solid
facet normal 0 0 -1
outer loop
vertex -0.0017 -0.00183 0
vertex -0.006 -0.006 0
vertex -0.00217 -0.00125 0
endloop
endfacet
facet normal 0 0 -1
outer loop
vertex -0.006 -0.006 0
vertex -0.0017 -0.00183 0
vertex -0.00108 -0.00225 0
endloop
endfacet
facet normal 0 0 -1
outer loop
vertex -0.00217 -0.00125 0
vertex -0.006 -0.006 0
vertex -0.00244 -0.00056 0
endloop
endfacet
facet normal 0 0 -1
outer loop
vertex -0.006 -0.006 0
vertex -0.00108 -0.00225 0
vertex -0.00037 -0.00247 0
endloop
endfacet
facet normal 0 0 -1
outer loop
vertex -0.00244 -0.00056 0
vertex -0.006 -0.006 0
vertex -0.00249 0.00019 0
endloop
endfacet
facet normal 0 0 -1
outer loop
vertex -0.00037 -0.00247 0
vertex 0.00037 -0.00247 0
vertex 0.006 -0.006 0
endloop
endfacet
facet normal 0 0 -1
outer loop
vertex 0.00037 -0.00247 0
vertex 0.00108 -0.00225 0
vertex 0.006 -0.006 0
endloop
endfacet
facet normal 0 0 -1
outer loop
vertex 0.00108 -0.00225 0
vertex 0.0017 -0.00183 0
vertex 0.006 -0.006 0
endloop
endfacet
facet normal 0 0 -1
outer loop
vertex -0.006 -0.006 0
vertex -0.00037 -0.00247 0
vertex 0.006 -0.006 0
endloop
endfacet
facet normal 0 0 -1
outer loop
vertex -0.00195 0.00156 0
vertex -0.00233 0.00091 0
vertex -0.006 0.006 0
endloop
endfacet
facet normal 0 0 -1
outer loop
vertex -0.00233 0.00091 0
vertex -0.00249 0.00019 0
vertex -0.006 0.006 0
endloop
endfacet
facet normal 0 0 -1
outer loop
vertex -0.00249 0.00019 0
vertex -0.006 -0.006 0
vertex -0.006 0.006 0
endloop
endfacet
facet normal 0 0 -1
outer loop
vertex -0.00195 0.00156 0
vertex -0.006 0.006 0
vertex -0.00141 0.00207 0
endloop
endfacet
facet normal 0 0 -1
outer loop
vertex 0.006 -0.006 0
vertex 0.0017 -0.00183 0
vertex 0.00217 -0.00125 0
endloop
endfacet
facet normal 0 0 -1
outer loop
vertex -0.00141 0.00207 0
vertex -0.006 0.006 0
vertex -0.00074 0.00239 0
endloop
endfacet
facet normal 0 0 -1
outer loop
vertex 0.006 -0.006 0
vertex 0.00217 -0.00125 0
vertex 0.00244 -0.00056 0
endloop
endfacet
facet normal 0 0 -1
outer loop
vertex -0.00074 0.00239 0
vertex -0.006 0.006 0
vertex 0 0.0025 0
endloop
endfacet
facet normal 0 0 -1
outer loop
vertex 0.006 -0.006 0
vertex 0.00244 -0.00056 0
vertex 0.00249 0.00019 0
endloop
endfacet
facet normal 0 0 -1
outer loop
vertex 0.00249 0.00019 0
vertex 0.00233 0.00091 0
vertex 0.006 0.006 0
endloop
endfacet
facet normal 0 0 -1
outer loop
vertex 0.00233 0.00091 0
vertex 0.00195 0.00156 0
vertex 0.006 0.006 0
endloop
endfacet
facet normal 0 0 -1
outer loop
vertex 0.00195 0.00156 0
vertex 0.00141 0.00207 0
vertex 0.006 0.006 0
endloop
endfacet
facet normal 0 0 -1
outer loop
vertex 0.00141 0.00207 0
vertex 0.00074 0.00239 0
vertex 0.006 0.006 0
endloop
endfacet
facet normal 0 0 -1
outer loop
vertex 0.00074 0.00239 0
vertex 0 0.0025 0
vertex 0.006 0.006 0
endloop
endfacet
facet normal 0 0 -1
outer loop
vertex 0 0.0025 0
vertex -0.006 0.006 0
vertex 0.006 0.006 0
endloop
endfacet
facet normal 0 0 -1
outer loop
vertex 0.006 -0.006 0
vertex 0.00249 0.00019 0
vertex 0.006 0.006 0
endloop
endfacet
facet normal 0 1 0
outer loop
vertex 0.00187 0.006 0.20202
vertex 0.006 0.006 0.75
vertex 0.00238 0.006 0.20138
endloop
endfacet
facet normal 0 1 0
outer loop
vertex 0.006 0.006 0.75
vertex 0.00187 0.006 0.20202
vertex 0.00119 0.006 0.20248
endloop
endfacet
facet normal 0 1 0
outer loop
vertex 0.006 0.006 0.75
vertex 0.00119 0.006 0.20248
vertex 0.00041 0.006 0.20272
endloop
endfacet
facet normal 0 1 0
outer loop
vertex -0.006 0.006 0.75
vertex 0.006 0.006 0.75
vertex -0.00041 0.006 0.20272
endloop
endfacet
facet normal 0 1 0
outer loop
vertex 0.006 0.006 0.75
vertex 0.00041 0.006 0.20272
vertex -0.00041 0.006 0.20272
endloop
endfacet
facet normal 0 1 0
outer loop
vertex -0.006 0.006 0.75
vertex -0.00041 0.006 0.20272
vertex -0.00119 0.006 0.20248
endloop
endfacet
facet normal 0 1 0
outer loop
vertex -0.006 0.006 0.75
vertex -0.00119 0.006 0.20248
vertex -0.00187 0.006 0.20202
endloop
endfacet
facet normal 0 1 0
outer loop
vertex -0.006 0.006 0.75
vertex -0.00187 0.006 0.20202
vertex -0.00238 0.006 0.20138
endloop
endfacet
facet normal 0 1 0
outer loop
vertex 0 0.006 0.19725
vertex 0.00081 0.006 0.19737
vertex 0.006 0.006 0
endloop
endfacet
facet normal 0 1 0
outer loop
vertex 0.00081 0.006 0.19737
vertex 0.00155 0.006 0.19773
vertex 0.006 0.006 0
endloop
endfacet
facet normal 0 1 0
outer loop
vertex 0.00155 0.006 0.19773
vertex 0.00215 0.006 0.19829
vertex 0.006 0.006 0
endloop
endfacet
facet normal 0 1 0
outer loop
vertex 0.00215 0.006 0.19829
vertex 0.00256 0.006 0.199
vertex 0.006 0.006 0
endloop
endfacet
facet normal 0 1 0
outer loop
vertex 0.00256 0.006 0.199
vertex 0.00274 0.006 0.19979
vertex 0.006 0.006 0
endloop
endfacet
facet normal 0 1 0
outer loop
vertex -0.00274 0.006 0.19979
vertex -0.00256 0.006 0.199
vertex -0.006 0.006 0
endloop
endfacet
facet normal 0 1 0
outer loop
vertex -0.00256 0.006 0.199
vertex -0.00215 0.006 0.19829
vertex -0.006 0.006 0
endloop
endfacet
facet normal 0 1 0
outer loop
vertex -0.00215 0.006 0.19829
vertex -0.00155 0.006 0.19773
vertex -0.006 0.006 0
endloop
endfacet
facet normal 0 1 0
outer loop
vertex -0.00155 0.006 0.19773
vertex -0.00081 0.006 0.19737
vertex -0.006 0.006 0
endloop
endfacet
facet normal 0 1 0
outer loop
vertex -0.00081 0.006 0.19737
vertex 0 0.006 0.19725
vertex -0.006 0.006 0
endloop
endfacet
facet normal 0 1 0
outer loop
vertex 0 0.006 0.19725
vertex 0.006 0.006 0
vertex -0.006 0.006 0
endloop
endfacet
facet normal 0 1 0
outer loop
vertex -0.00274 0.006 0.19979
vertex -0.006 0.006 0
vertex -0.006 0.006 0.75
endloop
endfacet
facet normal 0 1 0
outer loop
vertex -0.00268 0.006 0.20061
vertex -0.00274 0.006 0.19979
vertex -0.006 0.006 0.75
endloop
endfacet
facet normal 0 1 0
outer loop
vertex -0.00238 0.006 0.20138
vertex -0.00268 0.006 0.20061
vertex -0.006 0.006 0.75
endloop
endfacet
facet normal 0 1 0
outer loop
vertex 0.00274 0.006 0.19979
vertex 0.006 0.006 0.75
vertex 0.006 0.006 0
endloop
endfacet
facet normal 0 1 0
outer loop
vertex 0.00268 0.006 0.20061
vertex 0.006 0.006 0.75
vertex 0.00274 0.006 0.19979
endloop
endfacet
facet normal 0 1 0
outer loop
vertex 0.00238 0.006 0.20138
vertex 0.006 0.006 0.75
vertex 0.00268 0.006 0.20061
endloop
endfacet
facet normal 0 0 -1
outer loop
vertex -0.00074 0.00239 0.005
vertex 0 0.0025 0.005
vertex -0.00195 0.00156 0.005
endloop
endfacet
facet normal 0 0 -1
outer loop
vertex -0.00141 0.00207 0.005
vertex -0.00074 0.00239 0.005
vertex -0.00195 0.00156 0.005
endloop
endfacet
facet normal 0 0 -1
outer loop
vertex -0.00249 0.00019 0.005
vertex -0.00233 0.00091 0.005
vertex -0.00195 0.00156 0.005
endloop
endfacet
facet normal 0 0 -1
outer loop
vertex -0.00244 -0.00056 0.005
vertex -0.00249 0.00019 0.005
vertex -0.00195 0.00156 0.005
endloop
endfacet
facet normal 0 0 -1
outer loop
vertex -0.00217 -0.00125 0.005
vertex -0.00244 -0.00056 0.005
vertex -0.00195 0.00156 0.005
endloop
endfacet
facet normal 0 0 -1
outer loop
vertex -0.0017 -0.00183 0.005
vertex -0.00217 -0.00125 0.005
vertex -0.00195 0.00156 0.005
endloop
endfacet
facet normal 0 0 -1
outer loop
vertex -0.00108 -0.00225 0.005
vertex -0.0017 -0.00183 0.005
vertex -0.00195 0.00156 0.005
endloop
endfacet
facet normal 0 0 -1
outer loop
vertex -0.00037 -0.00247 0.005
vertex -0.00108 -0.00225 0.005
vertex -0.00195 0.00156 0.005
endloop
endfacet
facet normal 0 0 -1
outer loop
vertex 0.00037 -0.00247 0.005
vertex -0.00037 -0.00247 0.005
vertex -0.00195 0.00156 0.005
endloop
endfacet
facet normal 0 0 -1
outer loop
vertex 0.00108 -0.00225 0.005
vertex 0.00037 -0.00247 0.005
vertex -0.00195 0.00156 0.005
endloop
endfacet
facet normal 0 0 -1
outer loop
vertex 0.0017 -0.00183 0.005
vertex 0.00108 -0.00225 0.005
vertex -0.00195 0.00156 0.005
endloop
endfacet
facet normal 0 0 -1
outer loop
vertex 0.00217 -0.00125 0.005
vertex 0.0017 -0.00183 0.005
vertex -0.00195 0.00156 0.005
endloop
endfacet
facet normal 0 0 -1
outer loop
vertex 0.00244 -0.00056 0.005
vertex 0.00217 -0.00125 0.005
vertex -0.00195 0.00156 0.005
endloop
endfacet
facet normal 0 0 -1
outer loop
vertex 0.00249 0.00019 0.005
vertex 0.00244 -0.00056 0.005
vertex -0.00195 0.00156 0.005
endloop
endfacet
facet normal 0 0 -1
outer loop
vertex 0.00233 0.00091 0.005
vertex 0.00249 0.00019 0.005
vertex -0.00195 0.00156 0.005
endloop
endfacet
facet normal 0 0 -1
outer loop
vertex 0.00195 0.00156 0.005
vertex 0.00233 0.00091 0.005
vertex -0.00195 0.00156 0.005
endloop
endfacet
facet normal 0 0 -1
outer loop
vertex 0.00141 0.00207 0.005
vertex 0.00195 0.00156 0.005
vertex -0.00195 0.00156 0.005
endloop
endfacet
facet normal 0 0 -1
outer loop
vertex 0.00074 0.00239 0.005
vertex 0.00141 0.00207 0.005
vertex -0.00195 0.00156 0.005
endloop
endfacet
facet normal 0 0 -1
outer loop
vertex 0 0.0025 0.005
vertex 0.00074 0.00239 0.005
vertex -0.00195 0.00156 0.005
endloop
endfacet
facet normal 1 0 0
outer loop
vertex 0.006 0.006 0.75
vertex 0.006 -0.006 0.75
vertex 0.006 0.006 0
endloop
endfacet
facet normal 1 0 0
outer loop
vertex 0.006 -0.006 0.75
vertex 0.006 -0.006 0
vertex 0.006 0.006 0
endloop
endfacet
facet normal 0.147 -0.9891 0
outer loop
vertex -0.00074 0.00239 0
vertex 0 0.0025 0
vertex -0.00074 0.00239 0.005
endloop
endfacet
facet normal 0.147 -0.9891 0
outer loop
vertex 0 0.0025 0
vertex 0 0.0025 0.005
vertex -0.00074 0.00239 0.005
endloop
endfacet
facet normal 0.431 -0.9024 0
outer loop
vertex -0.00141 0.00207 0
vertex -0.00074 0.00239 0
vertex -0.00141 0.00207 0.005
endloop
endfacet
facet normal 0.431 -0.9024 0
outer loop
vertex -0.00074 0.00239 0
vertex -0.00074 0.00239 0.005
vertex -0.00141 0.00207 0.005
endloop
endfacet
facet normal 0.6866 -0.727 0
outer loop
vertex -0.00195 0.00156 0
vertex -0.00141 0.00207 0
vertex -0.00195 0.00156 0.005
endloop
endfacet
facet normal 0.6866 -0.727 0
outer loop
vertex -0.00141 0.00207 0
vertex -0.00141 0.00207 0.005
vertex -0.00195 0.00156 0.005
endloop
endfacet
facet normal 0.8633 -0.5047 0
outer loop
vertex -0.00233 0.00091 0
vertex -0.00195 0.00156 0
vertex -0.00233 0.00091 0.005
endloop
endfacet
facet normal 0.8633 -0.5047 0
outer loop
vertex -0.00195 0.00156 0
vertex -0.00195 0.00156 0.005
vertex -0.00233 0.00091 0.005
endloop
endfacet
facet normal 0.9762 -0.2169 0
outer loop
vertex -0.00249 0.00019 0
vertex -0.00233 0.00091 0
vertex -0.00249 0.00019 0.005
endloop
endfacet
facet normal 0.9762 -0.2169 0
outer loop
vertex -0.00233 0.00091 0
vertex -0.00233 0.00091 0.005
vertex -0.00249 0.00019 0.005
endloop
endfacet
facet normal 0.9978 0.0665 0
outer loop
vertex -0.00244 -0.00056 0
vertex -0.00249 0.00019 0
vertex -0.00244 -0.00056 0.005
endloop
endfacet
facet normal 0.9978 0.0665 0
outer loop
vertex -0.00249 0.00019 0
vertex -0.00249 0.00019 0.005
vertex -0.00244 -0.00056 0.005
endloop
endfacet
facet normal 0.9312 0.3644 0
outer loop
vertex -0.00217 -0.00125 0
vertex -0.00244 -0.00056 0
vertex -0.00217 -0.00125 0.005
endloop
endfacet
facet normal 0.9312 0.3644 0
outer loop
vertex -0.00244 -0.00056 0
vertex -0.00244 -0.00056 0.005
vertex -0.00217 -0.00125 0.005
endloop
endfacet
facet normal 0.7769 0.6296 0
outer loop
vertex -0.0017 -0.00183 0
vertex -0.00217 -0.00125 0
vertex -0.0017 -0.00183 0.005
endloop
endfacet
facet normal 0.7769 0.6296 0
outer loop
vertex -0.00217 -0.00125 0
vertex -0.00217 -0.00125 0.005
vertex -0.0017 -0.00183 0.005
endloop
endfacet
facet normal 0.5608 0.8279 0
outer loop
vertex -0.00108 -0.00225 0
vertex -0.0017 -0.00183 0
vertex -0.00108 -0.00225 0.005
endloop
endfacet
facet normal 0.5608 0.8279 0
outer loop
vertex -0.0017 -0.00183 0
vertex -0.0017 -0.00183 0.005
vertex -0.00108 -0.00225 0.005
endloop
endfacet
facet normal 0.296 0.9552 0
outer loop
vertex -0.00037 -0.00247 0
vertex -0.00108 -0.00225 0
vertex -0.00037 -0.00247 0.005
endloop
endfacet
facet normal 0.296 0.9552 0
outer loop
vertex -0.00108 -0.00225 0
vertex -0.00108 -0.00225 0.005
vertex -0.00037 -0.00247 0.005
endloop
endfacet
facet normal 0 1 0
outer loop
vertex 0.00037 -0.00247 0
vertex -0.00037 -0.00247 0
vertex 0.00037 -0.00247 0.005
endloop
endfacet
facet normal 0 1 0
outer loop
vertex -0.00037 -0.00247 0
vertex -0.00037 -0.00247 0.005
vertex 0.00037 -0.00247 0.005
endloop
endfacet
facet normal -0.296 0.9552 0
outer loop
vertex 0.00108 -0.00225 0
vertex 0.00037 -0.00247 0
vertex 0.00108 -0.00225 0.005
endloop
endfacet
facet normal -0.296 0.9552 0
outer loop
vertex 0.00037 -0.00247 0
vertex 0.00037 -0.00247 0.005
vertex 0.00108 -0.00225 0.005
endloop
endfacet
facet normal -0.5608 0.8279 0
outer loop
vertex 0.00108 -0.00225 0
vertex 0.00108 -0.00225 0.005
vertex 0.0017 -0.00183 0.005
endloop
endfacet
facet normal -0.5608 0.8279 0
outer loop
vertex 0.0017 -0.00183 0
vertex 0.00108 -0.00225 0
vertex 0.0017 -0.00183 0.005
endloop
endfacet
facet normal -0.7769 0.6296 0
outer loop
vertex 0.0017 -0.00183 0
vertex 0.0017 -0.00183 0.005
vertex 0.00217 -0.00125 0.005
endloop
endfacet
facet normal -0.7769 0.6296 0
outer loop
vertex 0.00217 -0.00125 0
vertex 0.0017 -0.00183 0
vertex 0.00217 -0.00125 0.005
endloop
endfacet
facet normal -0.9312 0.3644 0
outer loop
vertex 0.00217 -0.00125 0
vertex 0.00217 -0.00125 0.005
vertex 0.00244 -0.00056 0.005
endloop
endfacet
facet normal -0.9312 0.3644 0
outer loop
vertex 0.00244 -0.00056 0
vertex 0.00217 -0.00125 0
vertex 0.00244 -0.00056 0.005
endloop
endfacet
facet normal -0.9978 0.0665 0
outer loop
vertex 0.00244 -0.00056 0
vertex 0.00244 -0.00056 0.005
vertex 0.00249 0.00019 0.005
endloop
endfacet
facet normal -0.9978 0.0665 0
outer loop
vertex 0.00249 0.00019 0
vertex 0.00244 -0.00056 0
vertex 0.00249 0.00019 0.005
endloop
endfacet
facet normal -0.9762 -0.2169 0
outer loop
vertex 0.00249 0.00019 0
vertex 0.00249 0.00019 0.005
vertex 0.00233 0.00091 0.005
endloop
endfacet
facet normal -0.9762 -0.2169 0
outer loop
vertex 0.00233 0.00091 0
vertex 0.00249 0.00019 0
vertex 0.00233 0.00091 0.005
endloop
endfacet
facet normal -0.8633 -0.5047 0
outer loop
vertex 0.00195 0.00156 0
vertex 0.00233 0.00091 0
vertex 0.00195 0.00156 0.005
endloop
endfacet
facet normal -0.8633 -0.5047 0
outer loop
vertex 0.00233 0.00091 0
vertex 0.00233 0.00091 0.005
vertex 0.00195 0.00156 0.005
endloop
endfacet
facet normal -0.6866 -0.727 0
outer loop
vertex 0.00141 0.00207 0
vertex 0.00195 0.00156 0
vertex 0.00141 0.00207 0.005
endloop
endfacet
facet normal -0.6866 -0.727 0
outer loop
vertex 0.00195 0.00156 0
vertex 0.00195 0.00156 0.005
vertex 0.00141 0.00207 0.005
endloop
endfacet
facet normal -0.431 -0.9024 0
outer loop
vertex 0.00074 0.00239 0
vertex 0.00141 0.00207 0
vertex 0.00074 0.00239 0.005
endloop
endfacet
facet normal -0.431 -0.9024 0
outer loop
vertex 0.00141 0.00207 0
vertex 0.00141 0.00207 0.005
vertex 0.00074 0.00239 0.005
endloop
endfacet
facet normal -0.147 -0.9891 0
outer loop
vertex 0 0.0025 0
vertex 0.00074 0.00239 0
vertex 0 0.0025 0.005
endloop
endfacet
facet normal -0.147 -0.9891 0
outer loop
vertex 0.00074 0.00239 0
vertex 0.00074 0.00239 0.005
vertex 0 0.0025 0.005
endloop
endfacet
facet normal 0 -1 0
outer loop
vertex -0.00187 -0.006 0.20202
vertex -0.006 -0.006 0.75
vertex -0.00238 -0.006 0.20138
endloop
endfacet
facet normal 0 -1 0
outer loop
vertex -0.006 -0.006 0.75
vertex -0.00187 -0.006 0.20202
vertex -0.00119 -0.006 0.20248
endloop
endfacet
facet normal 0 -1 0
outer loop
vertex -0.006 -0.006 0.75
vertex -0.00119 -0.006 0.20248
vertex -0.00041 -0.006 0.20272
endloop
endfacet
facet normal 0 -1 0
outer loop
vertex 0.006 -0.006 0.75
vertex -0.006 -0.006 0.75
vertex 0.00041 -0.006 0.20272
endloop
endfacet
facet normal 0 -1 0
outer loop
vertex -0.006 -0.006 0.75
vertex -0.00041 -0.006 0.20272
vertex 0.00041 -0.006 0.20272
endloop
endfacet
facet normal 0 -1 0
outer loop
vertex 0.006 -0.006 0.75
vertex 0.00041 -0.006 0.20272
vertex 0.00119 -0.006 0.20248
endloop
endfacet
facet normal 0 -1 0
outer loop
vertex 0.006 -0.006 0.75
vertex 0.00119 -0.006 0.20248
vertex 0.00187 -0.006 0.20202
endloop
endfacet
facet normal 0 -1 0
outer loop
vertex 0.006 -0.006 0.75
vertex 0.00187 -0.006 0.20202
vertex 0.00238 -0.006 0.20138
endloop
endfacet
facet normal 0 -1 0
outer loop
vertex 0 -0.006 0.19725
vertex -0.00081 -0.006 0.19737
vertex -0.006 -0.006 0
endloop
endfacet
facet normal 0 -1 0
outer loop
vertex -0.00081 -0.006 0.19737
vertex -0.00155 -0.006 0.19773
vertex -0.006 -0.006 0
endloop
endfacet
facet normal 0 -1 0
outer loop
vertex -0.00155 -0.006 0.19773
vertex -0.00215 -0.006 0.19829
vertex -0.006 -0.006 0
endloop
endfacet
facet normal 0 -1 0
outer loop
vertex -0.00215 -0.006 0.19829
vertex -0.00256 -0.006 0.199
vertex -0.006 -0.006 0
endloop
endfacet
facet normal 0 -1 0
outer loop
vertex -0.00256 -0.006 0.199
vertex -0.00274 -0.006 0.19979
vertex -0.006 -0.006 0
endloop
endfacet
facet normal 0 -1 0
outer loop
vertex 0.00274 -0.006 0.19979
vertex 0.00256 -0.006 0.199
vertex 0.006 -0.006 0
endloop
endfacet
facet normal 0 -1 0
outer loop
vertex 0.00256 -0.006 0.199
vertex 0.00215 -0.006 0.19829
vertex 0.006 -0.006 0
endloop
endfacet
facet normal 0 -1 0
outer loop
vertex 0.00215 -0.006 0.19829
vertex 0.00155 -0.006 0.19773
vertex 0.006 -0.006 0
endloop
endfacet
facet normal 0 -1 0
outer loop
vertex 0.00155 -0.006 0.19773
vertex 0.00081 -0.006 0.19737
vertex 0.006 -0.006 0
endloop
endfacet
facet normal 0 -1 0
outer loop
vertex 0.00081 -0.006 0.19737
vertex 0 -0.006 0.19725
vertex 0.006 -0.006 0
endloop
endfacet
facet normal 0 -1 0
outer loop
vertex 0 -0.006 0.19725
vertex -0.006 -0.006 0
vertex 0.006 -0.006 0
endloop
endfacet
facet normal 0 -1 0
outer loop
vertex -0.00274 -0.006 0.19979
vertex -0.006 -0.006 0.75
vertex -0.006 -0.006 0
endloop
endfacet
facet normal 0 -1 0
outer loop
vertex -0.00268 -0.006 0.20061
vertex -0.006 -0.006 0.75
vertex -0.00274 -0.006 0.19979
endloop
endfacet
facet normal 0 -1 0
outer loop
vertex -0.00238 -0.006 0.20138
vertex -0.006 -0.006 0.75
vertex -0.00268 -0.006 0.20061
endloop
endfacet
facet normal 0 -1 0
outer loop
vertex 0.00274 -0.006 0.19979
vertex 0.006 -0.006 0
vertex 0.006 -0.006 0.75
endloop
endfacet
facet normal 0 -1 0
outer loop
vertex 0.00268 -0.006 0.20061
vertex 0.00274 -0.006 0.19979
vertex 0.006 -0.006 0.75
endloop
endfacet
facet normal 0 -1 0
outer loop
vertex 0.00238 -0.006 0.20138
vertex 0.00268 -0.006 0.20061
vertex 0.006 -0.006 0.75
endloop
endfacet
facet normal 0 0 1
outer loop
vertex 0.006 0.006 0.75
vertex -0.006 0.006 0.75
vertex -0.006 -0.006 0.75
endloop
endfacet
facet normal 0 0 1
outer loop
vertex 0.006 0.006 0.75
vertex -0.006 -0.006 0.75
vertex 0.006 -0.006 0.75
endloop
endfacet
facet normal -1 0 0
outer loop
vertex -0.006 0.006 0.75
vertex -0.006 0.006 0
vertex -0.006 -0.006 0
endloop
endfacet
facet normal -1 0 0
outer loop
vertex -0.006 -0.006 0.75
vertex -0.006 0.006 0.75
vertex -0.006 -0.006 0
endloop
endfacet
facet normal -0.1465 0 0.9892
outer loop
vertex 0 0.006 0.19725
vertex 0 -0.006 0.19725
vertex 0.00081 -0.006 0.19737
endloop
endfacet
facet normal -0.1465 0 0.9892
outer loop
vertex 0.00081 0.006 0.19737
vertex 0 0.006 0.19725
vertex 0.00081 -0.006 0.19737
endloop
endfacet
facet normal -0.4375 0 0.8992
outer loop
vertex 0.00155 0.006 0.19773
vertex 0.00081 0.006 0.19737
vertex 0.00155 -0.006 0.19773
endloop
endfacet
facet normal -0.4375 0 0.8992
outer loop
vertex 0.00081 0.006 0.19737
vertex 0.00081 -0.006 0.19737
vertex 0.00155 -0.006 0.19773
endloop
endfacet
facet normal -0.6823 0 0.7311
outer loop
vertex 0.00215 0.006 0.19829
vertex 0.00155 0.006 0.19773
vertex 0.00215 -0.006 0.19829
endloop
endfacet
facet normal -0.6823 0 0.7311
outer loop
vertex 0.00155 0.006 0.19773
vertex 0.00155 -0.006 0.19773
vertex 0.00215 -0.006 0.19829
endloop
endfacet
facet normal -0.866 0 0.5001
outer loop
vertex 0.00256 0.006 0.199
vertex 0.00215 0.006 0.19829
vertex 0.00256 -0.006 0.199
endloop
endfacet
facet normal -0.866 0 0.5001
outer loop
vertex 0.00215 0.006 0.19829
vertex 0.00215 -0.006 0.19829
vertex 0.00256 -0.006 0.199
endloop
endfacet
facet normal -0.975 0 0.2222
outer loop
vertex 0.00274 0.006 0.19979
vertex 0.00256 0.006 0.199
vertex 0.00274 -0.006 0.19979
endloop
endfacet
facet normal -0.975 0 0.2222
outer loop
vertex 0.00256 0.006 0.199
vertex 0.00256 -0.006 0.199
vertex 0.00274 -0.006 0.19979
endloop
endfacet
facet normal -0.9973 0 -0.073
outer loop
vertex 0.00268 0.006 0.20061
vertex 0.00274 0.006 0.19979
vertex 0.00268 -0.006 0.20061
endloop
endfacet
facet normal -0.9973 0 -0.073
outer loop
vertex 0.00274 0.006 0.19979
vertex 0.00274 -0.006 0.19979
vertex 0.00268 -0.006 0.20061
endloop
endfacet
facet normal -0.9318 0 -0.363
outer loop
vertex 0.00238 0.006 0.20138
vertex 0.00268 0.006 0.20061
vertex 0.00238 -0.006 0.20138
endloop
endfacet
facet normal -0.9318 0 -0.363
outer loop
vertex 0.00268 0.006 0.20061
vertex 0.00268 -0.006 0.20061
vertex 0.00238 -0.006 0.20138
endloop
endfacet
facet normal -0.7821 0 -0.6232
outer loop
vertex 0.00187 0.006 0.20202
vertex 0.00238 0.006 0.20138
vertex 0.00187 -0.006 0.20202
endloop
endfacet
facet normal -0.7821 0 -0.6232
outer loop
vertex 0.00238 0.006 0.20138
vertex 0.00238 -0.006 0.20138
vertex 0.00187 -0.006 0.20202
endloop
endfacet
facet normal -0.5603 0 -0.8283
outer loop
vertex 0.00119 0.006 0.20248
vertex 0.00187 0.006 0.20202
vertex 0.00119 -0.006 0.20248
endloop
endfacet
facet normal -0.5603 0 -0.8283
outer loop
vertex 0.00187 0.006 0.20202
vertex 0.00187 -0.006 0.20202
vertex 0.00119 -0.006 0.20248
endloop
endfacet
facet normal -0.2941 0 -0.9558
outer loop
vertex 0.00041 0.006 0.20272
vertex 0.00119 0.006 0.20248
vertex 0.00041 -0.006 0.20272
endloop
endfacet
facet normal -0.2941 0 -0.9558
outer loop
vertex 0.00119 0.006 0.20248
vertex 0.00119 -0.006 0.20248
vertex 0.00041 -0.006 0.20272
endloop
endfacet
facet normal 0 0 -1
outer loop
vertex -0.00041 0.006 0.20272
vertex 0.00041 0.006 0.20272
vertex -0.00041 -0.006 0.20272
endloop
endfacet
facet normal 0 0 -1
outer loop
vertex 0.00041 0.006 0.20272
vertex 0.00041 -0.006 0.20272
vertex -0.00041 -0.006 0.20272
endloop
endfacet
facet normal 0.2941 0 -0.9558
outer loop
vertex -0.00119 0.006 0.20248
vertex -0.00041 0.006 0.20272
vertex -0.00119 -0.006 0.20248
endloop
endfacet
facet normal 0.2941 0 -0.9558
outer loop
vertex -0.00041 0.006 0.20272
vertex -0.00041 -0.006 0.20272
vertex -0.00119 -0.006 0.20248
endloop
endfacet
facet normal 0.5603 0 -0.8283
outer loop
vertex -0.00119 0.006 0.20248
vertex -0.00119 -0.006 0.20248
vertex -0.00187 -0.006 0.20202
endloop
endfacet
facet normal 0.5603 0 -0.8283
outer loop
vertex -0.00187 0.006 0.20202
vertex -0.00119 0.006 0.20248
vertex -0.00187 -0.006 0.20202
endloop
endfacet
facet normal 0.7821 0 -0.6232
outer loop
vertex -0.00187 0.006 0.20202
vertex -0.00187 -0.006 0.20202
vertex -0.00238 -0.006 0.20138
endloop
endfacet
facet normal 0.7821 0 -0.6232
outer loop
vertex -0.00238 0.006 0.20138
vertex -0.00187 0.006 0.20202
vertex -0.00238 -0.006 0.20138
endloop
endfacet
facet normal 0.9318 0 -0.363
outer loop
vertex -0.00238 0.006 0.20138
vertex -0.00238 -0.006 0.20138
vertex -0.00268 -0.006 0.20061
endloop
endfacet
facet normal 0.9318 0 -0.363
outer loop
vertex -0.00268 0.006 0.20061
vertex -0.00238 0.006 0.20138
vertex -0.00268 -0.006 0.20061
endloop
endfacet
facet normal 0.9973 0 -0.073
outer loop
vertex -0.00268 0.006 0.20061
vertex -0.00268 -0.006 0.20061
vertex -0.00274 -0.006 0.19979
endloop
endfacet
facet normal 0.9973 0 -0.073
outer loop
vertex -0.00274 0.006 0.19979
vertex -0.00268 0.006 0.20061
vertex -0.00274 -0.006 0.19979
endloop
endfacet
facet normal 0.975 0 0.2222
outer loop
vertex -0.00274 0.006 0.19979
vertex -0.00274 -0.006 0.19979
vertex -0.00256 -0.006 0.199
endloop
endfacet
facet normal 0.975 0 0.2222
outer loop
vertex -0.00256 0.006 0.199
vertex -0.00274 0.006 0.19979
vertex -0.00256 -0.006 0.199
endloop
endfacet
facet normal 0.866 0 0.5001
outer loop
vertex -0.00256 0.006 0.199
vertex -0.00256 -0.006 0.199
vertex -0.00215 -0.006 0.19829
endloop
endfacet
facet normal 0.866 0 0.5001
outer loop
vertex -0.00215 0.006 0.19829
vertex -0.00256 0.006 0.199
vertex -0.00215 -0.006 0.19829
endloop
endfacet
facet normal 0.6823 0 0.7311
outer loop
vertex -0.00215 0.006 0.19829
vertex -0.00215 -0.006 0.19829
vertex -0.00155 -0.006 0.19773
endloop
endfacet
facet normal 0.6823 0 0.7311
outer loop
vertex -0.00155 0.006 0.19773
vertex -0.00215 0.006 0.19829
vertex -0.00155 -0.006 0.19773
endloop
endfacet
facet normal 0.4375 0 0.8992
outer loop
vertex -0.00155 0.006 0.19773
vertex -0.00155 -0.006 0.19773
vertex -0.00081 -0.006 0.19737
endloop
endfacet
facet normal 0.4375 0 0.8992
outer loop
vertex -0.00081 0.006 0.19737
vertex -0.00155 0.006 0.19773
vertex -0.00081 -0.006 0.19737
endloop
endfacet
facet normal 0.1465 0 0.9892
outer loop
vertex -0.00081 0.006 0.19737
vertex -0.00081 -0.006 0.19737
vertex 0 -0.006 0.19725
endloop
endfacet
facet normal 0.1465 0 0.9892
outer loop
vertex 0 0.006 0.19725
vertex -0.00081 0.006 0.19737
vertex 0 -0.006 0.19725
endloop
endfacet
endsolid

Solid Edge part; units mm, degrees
sketch "Sketch1" plane through (0, 0, 0) normal (0, 0, 1) x (1, 0, 0)
  line L0 (-0.006, -0.006) -> (0.006, -0.006)
  line L1 (0.006, -0.006) -> (0.006, 0.006)
  line L2 (0.006, 0.006) -> (-0.006, 0.006)
  line L3 (-0.006, 0.006) -> (-0.006, -0.006)
  dimension "D1" = 0.012
extrude "Protrusion1" add sketch "Sketch1" along normal blind 0.75
hole "Bohrung_1" at (0, -0.006, 0.2) direction (0, 1, 0) diameter 0.0055 end through all
hole "Bohrung_2" at (0, 0, 0) direction (0, 0, 1) diameter 0.005 depth 0.005
